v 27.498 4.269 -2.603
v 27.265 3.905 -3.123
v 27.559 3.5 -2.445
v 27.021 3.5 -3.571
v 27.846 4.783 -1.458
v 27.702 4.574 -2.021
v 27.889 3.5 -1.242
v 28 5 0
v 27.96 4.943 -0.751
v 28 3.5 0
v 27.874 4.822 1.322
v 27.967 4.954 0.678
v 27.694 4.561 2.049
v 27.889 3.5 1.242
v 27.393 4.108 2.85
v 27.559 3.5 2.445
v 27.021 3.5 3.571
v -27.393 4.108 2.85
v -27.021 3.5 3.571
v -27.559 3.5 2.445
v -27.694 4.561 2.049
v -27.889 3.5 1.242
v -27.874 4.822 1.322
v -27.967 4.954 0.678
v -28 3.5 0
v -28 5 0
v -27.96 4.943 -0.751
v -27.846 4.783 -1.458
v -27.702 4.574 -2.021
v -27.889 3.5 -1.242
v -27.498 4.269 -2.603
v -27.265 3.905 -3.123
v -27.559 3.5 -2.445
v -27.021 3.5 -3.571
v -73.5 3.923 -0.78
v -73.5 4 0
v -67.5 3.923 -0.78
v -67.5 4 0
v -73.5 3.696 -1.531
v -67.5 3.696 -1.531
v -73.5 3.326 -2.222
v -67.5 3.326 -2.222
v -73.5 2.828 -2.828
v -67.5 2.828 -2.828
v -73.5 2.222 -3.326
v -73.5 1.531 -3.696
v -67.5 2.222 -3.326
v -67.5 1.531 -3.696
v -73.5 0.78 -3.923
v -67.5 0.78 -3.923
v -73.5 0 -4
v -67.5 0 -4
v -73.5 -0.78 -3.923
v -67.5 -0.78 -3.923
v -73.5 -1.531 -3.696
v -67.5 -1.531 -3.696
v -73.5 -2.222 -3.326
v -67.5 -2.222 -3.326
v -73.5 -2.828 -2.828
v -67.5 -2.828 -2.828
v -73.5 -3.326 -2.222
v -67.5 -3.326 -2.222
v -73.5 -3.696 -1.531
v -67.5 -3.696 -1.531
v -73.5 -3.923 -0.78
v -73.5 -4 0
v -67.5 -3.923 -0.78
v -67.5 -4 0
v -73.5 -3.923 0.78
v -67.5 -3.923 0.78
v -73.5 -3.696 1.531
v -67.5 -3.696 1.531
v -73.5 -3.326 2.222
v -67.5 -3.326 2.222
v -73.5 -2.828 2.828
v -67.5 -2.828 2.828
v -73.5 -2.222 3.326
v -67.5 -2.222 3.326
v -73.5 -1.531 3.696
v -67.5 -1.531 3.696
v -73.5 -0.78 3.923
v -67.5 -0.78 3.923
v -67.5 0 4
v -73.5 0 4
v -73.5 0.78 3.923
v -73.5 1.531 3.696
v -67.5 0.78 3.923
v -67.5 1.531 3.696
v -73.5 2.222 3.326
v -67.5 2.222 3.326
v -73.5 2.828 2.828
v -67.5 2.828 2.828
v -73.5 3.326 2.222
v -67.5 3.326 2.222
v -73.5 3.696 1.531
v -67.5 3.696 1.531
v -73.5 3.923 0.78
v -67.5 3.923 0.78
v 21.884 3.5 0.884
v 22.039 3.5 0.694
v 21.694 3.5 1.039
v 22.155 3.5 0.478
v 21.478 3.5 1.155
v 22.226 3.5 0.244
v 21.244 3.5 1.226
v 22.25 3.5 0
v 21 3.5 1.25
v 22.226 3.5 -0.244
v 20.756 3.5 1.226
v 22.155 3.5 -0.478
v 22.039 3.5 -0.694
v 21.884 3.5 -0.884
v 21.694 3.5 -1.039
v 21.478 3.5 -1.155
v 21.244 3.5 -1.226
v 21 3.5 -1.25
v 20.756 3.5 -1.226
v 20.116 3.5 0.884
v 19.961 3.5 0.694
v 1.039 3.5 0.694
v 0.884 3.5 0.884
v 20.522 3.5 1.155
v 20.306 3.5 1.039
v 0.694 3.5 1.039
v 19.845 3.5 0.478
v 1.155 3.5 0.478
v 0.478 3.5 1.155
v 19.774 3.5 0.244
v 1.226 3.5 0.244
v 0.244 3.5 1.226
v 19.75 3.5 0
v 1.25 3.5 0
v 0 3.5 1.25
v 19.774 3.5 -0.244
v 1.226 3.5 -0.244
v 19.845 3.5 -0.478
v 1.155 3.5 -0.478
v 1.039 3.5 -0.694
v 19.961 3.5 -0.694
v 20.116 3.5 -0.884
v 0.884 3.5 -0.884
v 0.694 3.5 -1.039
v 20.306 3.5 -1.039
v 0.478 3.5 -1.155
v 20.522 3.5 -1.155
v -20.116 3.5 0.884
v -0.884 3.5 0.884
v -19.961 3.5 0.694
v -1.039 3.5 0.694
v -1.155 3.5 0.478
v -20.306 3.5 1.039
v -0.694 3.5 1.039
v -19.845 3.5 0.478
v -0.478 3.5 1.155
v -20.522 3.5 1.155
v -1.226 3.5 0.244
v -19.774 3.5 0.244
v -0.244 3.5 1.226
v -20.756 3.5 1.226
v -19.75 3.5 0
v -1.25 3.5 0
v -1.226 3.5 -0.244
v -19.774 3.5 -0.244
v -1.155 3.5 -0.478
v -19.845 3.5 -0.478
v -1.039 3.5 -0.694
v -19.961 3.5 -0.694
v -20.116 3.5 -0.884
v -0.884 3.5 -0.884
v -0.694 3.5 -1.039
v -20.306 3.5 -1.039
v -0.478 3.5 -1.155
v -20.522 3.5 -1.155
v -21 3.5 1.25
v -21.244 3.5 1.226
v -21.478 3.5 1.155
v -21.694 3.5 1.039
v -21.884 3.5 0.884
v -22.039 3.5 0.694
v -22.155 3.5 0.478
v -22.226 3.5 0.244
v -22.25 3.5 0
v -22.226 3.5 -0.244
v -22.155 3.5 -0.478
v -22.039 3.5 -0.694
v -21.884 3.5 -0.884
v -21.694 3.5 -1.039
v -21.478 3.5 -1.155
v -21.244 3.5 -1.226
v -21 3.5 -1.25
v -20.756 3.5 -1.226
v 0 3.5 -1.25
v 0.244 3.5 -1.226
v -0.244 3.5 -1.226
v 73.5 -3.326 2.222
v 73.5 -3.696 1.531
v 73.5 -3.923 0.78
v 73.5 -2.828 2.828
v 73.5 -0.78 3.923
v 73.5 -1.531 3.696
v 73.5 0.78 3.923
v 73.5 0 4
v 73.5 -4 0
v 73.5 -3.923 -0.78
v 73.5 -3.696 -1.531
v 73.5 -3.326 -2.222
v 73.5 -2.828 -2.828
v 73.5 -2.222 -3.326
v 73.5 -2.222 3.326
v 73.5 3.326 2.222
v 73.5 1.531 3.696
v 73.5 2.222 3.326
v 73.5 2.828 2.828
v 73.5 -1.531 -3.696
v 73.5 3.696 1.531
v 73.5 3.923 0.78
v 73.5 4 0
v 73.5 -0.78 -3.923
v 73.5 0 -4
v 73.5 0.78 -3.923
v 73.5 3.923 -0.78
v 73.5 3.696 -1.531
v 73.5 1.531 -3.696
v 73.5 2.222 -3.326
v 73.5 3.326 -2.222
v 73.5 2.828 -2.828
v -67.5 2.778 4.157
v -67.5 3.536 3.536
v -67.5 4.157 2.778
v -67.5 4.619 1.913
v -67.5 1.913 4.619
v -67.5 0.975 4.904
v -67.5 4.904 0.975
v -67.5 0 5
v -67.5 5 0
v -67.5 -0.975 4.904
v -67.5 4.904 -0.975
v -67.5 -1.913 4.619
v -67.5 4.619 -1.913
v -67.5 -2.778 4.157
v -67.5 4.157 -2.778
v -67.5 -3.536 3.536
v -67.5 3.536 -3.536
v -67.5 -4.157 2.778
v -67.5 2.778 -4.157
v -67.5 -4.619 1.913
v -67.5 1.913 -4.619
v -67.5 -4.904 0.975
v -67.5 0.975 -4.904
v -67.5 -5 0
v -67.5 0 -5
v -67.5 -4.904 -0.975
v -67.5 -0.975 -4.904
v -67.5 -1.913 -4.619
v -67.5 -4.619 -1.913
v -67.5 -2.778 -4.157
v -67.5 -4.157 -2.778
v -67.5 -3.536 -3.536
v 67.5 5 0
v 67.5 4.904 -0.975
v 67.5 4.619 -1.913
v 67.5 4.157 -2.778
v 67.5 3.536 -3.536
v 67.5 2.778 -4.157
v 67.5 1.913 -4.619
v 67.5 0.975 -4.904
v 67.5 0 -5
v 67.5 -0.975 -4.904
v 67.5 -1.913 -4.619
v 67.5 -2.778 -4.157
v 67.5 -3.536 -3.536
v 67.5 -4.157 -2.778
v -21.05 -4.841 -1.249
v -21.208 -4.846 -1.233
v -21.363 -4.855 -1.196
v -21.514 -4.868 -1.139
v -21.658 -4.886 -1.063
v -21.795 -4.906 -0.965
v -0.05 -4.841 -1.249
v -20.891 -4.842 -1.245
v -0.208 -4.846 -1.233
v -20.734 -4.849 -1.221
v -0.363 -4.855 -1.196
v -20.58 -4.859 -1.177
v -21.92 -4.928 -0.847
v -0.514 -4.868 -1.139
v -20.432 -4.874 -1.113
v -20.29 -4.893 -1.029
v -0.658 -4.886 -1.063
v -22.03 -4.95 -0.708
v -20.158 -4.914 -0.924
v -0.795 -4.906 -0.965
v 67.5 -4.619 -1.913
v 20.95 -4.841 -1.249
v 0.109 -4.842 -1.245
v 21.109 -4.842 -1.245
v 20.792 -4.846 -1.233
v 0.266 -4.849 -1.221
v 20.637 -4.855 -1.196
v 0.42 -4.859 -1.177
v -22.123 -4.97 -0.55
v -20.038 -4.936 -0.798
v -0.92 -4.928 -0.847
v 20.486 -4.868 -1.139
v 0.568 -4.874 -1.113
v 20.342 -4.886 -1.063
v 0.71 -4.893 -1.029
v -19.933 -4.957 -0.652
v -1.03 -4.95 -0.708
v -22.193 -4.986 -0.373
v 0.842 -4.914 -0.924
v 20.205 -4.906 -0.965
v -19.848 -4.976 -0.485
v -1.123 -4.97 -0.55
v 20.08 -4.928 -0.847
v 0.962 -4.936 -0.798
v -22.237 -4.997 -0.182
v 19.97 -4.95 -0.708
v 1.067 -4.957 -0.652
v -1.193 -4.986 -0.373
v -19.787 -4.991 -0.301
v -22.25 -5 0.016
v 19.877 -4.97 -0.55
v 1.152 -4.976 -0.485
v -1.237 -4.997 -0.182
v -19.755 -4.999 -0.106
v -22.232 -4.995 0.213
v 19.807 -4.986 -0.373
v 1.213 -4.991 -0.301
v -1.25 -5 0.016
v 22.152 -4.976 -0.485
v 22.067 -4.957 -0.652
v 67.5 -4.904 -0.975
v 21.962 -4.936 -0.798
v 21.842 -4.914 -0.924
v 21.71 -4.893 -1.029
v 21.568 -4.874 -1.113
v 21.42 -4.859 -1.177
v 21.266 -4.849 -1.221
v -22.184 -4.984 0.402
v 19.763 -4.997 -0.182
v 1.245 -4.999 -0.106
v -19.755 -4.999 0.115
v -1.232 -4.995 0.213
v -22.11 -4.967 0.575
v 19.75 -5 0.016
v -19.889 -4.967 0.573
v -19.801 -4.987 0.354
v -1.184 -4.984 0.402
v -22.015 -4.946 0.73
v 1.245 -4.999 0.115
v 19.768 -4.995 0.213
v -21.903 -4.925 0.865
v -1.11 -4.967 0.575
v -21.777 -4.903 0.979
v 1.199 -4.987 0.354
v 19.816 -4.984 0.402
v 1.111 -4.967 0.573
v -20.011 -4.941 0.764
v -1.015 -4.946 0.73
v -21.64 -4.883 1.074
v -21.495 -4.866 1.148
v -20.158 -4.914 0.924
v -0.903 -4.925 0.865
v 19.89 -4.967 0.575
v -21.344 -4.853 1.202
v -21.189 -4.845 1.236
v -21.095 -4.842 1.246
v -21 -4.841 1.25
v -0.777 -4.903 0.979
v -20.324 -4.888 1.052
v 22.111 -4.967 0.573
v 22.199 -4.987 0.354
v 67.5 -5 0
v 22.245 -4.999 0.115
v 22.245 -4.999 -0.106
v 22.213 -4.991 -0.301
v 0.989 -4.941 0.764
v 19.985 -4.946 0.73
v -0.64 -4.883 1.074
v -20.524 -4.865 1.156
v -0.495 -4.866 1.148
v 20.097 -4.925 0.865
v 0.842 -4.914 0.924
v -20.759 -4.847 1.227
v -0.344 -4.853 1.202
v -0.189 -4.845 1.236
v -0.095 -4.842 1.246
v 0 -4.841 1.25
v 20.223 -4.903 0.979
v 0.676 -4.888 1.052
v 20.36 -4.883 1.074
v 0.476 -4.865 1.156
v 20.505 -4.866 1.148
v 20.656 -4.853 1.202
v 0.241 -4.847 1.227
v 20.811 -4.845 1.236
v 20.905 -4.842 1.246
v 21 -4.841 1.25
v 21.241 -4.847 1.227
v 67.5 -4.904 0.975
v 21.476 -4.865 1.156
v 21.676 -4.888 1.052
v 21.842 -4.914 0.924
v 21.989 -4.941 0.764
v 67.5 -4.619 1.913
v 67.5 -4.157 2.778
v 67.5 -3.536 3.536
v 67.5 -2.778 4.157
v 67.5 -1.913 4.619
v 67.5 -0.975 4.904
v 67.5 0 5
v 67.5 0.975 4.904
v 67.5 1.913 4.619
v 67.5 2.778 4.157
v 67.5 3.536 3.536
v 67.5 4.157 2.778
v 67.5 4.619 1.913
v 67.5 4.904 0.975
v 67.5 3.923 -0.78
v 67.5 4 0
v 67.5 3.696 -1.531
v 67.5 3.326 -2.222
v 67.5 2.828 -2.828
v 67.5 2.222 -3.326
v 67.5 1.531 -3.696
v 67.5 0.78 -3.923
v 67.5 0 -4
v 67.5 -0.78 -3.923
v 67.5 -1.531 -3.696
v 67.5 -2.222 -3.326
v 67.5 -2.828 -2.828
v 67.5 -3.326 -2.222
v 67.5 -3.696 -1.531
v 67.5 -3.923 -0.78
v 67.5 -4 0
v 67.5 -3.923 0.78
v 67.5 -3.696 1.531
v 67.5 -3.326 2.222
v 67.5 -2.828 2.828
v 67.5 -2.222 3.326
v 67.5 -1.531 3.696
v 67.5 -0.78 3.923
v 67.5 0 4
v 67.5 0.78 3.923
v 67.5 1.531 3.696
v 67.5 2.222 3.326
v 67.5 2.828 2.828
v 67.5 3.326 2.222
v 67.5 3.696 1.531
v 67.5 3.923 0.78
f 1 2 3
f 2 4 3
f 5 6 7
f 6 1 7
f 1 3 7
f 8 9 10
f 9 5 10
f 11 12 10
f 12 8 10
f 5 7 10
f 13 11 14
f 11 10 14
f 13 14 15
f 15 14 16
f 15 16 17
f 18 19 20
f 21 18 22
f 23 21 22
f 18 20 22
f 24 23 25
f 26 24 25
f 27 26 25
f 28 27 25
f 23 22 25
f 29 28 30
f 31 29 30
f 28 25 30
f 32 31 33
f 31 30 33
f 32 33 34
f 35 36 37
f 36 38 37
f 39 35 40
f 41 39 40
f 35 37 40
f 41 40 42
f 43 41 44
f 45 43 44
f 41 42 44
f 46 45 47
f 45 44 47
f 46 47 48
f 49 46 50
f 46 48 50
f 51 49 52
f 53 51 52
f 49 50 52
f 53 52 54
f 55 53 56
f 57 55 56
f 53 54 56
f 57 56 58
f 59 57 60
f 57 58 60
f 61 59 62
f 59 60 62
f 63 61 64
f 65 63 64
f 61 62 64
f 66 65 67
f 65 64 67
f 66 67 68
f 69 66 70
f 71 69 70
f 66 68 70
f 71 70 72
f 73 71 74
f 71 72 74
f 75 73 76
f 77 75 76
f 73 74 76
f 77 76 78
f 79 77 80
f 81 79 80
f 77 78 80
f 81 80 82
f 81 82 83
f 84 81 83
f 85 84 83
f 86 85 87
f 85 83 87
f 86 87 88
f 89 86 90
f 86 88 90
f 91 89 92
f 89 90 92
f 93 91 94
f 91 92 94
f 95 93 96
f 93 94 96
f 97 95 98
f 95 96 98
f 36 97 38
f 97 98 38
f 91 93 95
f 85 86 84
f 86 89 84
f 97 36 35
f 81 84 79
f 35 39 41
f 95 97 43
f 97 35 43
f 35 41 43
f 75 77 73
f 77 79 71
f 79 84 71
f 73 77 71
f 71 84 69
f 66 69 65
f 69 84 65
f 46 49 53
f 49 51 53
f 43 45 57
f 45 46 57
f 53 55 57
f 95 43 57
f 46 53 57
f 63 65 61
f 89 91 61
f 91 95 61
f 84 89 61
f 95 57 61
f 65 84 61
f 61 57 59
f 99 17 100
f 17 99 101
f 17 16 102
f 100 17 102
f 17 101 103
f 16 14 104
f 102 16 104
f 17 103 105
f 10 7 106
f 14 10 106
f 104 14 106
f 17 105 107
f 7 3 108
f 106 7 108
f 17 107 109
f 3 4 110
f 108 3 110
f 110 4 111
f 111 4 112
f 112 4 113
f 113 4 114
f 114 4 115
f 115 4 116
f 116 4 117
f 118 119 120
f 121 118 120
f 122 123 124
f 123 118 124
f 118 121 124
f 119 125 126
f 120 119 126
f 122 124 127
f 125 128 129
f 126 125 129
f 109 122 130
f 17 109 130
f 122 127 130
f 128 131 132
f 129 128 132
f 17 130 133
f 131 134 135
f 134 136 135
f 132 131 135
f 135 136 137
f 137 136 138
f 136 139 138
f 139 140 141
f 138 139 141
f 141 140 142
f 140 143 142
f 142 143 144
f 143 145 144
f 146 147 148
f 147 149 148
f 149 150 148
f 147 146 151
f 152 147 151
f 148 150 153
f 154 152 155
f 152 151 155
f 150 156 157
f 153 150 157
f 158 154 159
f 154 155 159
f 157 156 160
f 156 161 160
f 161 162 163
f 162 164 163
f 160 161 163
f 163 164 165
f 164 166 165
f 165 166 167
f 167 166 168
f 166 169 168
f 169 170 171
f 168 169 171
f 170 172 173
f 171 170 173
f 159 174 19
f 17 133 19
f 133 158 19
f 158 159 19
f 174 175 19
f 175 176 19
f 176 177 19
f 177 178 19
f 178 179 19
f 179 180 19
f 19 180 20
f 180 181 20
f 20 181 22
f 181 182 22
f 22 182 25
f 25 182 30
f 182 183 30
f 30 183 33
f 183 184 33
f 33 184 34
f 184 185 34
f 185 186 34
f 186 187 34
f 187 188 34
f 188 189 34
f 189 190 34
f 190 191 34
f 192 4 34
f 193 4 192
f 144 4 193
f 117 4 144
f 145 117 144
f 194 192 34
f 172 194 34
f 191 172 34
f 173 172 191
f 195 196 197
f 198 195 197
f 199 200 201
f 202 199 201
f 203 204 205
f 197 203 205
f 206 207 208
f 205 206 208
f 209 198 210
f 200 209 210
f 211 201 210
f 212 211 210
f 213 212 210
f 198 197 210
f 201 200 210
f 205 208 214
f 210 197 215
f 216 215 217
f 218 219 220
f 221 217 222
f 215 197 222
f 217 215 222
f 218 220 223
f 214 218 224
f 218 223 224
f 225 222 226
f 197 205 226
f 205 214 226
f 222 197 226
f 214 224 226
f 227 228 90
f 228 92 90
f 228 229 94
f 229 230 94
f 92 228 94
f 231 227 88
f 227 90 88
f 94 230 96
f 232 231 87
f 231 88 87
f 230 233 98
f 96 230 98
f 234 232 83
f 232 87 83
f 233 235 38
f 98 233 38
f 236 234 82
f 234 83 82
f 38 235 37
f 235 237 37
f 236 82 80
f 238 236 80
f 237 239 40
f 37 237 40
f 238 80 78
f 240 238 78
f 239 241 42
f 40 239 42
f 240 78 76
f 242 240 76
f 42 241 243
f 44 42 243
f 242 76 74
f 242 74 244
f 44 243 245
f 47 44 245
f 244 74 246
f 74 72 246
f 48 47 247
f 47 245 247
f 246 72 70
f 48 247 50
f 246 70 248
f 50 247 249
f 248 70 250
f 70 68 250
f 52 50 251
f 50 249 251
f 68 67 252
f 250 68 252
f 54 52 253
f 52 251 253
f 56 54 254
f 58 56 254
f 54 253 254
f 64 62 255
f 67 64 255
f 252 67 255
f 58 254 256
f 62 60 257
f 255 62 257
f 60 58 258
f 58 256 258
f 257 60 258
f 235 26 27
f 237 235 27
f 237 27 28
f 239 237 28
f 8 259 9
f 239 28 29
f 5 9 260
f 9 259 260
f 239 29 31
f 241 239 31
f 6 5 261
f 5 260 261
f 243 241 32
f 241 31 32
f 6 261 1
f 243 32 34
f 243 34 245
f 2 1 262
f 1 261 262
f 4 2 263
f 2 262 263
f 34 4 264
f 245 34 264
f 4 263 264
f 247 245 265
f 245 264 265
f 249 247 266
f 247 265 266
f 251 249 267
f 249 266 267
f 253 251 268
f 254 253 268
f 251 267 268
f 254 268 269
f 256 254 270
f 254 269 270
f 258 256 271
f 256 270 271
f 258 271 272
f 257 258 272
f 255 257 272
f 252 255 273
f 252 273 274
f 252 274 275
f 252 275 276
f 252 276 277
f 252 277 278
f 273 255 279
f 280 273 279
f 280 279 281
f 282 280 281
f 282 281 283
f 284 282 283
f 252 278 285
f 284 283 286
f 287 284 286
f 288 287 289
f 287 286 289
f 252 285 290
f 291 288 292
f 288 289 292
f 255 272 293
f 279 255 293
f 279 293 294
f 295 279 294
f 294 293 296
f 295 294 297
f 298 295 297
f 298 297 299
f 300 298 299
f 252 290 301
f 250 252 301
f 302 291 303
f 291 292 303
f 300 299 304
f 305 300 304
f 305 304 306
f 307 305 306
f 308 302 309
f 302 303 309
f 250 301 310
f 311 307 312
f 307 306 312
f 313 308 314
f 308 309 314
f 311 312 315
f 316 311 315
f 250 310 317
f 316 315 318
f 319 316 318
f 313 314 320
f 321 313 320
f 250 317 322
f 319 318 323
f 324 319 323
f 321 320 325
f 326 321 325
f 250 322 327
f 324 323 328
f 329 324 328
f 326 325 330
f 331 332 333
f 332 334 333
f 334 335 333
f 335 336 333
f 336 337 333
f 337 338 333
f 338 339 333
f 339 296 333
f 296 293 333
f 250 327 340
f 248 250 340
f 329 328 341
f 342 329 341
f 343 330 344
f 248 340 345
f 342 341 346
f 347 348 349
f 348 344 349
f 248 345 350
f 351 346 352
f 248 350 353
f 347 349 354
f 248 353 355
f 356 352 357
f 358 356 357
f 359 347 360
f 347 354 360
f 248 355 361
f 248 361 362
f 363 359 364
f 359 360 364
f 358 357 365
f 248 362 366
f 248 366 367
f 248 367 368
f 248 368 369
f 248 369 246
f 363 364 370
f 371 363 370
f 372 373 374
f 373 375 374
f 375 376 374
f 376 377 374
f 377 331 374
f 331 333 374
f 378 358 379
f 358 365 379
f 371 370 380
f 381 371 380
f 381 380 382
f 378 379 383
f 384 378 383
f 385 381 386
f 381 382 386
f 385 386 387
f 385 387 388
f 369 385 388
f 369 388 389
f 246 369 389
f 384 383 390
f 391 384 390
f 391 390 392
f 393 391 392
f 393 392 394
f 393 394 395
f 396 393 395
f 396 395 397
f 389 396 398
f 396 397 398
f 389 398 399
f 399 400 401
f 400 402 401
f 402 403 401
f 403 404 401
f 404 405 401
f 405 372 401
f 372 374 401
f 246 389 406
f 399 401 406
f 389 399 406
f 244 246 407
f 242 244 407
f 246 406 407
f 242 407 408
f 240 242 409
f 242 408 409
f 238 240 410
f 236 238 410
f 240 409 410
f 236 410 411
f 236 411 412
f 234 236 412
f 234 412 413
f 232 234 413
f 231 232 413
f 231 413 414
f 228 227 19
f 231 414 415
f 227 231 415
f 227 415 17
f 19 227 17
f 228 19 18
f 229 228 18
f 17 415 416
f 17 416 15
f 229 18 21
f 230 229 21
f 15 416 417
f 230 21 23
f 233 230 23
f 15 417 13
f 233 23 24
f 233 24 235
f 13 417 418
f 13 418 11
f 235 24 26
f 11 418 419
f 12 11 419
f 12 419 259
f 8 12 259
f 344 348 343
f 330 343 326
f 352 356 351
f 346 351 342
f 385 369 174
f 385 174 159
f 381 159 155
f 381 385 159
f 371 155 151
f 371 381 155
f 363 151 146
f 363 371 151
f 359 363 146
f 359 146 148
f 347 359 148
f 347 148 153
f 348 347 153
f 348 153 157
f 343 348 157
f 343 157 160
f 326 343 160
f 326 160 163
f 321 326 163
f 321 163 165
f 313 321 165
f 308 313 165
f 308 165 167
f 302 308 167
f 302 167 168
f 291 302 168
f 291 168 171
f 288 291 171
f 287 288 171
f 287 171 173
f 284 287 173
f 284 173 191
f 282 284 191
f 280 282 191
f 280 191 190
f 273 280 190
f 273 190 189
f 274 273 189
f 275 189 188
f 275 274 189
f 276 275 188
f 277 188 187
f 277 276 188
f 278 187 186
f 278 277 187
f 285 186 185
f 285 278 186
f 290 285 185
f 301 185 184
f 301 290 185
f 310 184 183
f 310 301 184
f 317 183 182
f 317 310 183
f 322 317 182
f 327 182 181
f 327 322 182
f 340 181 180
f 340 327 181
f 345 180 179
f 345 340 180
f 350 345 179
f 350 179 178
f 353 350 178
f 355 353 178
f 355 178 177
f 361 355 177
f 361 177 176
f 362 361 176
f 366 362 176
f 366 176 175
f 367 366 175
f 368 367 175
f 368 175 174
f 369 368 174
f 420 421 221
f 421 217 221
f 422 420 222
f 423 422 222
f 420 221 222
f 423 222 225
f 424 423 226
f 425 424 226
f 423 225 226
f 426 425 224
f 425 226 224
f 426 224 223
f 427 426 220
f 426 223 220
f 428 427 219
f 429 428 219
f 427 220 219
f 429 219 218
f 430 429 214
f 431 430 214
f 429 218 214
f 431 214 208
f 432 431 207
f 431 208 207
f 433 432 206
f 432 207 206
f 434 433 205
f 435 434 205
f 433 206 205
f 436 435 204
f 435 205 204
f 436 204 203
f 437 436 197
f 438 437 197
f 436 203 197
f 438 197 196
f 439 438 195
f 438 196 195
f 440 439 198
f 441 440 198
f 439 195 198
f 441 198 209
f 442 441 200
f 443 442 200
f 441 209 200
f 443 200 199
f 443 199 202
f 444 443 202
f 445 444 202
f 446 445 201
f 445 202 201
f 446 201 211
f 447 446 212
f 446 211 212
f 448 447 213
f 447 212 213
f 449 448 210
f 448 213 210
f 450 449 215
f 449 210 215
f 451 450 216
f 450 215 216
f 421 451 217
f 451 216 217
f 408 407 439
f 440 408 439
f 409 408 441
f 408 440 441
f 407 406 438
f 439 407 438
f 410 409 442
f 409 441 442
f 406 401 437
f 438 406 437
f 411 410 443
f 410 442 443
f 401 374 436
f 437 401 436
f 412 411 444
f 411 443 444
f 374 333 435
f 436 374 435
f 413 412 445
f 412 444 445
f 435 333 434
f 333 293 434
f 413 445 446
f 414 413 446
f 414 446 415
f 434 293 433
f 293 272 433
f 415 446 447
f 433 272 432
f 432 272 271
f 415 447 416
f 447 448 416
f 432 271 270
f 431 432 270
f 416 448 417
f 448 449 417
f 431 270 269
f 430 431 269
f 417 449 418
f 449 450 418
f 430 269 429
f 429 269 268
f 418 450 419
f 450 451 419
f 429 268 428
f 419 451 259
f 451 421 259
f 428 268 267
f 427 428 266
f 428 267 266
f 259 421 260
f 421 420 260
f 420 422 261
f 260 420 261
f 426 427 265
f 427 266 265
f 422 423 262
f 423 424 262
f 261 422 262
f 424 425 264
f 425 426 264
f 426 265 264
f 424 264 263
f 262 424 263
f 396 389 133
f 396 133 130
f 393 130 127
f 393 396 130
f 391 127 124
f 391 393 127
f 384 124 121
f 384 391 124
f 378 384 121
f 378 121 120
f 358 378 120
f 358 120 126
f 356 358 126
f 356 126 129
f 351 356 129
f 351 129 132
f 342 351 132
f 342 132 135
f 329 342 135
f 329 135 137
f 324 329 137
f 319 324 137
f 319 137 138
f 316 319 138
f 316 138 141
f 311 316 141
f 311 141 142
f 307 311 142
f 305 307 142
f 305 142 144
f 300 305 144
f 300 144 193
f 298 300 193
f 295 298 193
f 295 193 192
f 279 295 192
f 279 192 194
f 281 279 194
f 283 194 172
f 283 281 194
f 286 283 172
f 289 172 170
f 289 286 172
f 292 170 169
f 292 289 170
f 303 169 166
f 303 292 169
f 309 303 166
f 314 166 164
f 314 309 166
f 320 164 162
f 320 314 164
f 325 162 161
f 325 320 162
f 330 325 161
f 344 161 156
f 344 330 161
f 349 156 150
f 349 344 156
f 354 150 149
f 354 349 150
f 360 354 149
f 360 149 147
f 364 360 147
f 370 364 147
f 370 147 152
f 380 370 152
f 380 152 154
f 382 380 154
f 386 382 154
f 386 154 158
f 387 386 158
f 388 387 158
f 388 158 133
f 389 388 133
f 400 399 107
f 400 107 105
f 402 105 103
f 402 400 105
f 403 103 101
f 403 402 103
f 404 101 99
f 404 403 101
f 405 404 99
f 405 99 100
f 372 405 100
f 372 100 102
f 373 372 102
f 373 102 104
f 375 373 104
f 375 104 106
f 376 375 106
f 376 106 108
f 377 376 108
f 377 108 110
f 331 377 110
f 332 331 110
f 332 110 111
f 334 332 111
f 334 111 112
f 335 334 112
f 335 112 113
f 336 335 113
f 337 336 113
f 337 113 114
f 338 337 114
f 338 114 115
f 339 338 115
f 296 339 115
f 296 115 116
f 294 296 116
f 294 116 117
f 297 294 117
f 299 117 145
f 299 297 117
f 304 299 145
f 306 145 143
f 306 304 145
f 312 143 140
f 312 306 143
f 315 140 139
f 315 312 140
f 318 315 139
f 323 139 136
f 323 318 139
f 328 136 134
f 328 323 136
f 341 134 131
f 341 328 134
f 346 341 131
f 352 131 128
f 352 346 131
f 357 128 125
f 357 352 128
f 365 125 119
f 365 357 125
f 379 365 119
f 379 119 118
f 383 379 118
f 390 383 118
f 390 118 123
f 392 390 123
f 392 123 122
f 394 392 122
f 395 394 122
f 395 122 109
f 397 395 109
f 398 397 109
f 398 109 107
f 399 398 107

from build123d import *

# Parameters (mm, degrees)
ENL_V_MAT_EXTRU_1_DEPTH      = 74.839352652
ENL_V_MAT_EXTRU_1_DEPTH_BACK = 74.839352652
ESQUISSE2_R                  = 1.25
ENL_V_START                  = 3.5
ENL_V_MAT_EXTRU_2_DEPTH      = 10


with BuildPart() as part:
    # Esquisse1 → Révolution1 (revolve)
    with BuildSketch(Plane.XY):
        Polygon((-67.5, 5), (67.5, 5), (67.5, 4), (73.5, 4), (73.5, 0), (-73.5, 0), (-73.5, 4), (-67.5, 4), align=None)
    revolve(axis=Axis((-73.5, 0, 0), (-1, 0, 0)))

    # Esquisse2 → Enlèv. mat.-Extru.1 (cut, two sides: drawn at the far end of the back side and taken through both)
    with BuildSketch(Plane(origin=(0, 0, 0), x_dir=(1, 0, 0), z_dir=(0, 1, 0)).offset(-ENL_V_MAT_EXTRU_1_DEPTH_BACK)):
        with Locations(Location((-21, 0, 0), (0, 0, 270))):
            Circle(ESQUISSE2_R)
        with Locations(Location((21, 0, 0), (0, 0, 270))):
            Circle(ESQUISSE2_R)
        with Locations(Location((0, 0, 0), (0, 0, 270))):
            Circle(ESQUISSE2_R)
    extrude(amount=ENL_V_MAT_EXTRU_1_DEPTH + ENL_V_MAT_EXTRU_1_DEPTH_BACK, mode=Mode.SUBTRACT)

    # Esquisse3 → Enlèv. mat.-Extru.2 (cut)
    with BuildSketch(Plane(origin=(0, 0, 0), x_dir=(1, 0, 0), z_dir=(0, 1, 0)).offset(ENL_V_START)):
        with BuildLine():
            Line((-21, 7), (21, 7))
            ThreePointArc((21, 7), (28, 0), (21, -7))
            Line((21, -7), (-21, -7))
            ThreePointArc((-21, -7), (-28, 0), (-21, 7))
        make_face()
    extrude(amount=ENL_V_MAT_EXTRU_2_DEPTH, mode=Mode.SUBTRACT)


solid = part.part
